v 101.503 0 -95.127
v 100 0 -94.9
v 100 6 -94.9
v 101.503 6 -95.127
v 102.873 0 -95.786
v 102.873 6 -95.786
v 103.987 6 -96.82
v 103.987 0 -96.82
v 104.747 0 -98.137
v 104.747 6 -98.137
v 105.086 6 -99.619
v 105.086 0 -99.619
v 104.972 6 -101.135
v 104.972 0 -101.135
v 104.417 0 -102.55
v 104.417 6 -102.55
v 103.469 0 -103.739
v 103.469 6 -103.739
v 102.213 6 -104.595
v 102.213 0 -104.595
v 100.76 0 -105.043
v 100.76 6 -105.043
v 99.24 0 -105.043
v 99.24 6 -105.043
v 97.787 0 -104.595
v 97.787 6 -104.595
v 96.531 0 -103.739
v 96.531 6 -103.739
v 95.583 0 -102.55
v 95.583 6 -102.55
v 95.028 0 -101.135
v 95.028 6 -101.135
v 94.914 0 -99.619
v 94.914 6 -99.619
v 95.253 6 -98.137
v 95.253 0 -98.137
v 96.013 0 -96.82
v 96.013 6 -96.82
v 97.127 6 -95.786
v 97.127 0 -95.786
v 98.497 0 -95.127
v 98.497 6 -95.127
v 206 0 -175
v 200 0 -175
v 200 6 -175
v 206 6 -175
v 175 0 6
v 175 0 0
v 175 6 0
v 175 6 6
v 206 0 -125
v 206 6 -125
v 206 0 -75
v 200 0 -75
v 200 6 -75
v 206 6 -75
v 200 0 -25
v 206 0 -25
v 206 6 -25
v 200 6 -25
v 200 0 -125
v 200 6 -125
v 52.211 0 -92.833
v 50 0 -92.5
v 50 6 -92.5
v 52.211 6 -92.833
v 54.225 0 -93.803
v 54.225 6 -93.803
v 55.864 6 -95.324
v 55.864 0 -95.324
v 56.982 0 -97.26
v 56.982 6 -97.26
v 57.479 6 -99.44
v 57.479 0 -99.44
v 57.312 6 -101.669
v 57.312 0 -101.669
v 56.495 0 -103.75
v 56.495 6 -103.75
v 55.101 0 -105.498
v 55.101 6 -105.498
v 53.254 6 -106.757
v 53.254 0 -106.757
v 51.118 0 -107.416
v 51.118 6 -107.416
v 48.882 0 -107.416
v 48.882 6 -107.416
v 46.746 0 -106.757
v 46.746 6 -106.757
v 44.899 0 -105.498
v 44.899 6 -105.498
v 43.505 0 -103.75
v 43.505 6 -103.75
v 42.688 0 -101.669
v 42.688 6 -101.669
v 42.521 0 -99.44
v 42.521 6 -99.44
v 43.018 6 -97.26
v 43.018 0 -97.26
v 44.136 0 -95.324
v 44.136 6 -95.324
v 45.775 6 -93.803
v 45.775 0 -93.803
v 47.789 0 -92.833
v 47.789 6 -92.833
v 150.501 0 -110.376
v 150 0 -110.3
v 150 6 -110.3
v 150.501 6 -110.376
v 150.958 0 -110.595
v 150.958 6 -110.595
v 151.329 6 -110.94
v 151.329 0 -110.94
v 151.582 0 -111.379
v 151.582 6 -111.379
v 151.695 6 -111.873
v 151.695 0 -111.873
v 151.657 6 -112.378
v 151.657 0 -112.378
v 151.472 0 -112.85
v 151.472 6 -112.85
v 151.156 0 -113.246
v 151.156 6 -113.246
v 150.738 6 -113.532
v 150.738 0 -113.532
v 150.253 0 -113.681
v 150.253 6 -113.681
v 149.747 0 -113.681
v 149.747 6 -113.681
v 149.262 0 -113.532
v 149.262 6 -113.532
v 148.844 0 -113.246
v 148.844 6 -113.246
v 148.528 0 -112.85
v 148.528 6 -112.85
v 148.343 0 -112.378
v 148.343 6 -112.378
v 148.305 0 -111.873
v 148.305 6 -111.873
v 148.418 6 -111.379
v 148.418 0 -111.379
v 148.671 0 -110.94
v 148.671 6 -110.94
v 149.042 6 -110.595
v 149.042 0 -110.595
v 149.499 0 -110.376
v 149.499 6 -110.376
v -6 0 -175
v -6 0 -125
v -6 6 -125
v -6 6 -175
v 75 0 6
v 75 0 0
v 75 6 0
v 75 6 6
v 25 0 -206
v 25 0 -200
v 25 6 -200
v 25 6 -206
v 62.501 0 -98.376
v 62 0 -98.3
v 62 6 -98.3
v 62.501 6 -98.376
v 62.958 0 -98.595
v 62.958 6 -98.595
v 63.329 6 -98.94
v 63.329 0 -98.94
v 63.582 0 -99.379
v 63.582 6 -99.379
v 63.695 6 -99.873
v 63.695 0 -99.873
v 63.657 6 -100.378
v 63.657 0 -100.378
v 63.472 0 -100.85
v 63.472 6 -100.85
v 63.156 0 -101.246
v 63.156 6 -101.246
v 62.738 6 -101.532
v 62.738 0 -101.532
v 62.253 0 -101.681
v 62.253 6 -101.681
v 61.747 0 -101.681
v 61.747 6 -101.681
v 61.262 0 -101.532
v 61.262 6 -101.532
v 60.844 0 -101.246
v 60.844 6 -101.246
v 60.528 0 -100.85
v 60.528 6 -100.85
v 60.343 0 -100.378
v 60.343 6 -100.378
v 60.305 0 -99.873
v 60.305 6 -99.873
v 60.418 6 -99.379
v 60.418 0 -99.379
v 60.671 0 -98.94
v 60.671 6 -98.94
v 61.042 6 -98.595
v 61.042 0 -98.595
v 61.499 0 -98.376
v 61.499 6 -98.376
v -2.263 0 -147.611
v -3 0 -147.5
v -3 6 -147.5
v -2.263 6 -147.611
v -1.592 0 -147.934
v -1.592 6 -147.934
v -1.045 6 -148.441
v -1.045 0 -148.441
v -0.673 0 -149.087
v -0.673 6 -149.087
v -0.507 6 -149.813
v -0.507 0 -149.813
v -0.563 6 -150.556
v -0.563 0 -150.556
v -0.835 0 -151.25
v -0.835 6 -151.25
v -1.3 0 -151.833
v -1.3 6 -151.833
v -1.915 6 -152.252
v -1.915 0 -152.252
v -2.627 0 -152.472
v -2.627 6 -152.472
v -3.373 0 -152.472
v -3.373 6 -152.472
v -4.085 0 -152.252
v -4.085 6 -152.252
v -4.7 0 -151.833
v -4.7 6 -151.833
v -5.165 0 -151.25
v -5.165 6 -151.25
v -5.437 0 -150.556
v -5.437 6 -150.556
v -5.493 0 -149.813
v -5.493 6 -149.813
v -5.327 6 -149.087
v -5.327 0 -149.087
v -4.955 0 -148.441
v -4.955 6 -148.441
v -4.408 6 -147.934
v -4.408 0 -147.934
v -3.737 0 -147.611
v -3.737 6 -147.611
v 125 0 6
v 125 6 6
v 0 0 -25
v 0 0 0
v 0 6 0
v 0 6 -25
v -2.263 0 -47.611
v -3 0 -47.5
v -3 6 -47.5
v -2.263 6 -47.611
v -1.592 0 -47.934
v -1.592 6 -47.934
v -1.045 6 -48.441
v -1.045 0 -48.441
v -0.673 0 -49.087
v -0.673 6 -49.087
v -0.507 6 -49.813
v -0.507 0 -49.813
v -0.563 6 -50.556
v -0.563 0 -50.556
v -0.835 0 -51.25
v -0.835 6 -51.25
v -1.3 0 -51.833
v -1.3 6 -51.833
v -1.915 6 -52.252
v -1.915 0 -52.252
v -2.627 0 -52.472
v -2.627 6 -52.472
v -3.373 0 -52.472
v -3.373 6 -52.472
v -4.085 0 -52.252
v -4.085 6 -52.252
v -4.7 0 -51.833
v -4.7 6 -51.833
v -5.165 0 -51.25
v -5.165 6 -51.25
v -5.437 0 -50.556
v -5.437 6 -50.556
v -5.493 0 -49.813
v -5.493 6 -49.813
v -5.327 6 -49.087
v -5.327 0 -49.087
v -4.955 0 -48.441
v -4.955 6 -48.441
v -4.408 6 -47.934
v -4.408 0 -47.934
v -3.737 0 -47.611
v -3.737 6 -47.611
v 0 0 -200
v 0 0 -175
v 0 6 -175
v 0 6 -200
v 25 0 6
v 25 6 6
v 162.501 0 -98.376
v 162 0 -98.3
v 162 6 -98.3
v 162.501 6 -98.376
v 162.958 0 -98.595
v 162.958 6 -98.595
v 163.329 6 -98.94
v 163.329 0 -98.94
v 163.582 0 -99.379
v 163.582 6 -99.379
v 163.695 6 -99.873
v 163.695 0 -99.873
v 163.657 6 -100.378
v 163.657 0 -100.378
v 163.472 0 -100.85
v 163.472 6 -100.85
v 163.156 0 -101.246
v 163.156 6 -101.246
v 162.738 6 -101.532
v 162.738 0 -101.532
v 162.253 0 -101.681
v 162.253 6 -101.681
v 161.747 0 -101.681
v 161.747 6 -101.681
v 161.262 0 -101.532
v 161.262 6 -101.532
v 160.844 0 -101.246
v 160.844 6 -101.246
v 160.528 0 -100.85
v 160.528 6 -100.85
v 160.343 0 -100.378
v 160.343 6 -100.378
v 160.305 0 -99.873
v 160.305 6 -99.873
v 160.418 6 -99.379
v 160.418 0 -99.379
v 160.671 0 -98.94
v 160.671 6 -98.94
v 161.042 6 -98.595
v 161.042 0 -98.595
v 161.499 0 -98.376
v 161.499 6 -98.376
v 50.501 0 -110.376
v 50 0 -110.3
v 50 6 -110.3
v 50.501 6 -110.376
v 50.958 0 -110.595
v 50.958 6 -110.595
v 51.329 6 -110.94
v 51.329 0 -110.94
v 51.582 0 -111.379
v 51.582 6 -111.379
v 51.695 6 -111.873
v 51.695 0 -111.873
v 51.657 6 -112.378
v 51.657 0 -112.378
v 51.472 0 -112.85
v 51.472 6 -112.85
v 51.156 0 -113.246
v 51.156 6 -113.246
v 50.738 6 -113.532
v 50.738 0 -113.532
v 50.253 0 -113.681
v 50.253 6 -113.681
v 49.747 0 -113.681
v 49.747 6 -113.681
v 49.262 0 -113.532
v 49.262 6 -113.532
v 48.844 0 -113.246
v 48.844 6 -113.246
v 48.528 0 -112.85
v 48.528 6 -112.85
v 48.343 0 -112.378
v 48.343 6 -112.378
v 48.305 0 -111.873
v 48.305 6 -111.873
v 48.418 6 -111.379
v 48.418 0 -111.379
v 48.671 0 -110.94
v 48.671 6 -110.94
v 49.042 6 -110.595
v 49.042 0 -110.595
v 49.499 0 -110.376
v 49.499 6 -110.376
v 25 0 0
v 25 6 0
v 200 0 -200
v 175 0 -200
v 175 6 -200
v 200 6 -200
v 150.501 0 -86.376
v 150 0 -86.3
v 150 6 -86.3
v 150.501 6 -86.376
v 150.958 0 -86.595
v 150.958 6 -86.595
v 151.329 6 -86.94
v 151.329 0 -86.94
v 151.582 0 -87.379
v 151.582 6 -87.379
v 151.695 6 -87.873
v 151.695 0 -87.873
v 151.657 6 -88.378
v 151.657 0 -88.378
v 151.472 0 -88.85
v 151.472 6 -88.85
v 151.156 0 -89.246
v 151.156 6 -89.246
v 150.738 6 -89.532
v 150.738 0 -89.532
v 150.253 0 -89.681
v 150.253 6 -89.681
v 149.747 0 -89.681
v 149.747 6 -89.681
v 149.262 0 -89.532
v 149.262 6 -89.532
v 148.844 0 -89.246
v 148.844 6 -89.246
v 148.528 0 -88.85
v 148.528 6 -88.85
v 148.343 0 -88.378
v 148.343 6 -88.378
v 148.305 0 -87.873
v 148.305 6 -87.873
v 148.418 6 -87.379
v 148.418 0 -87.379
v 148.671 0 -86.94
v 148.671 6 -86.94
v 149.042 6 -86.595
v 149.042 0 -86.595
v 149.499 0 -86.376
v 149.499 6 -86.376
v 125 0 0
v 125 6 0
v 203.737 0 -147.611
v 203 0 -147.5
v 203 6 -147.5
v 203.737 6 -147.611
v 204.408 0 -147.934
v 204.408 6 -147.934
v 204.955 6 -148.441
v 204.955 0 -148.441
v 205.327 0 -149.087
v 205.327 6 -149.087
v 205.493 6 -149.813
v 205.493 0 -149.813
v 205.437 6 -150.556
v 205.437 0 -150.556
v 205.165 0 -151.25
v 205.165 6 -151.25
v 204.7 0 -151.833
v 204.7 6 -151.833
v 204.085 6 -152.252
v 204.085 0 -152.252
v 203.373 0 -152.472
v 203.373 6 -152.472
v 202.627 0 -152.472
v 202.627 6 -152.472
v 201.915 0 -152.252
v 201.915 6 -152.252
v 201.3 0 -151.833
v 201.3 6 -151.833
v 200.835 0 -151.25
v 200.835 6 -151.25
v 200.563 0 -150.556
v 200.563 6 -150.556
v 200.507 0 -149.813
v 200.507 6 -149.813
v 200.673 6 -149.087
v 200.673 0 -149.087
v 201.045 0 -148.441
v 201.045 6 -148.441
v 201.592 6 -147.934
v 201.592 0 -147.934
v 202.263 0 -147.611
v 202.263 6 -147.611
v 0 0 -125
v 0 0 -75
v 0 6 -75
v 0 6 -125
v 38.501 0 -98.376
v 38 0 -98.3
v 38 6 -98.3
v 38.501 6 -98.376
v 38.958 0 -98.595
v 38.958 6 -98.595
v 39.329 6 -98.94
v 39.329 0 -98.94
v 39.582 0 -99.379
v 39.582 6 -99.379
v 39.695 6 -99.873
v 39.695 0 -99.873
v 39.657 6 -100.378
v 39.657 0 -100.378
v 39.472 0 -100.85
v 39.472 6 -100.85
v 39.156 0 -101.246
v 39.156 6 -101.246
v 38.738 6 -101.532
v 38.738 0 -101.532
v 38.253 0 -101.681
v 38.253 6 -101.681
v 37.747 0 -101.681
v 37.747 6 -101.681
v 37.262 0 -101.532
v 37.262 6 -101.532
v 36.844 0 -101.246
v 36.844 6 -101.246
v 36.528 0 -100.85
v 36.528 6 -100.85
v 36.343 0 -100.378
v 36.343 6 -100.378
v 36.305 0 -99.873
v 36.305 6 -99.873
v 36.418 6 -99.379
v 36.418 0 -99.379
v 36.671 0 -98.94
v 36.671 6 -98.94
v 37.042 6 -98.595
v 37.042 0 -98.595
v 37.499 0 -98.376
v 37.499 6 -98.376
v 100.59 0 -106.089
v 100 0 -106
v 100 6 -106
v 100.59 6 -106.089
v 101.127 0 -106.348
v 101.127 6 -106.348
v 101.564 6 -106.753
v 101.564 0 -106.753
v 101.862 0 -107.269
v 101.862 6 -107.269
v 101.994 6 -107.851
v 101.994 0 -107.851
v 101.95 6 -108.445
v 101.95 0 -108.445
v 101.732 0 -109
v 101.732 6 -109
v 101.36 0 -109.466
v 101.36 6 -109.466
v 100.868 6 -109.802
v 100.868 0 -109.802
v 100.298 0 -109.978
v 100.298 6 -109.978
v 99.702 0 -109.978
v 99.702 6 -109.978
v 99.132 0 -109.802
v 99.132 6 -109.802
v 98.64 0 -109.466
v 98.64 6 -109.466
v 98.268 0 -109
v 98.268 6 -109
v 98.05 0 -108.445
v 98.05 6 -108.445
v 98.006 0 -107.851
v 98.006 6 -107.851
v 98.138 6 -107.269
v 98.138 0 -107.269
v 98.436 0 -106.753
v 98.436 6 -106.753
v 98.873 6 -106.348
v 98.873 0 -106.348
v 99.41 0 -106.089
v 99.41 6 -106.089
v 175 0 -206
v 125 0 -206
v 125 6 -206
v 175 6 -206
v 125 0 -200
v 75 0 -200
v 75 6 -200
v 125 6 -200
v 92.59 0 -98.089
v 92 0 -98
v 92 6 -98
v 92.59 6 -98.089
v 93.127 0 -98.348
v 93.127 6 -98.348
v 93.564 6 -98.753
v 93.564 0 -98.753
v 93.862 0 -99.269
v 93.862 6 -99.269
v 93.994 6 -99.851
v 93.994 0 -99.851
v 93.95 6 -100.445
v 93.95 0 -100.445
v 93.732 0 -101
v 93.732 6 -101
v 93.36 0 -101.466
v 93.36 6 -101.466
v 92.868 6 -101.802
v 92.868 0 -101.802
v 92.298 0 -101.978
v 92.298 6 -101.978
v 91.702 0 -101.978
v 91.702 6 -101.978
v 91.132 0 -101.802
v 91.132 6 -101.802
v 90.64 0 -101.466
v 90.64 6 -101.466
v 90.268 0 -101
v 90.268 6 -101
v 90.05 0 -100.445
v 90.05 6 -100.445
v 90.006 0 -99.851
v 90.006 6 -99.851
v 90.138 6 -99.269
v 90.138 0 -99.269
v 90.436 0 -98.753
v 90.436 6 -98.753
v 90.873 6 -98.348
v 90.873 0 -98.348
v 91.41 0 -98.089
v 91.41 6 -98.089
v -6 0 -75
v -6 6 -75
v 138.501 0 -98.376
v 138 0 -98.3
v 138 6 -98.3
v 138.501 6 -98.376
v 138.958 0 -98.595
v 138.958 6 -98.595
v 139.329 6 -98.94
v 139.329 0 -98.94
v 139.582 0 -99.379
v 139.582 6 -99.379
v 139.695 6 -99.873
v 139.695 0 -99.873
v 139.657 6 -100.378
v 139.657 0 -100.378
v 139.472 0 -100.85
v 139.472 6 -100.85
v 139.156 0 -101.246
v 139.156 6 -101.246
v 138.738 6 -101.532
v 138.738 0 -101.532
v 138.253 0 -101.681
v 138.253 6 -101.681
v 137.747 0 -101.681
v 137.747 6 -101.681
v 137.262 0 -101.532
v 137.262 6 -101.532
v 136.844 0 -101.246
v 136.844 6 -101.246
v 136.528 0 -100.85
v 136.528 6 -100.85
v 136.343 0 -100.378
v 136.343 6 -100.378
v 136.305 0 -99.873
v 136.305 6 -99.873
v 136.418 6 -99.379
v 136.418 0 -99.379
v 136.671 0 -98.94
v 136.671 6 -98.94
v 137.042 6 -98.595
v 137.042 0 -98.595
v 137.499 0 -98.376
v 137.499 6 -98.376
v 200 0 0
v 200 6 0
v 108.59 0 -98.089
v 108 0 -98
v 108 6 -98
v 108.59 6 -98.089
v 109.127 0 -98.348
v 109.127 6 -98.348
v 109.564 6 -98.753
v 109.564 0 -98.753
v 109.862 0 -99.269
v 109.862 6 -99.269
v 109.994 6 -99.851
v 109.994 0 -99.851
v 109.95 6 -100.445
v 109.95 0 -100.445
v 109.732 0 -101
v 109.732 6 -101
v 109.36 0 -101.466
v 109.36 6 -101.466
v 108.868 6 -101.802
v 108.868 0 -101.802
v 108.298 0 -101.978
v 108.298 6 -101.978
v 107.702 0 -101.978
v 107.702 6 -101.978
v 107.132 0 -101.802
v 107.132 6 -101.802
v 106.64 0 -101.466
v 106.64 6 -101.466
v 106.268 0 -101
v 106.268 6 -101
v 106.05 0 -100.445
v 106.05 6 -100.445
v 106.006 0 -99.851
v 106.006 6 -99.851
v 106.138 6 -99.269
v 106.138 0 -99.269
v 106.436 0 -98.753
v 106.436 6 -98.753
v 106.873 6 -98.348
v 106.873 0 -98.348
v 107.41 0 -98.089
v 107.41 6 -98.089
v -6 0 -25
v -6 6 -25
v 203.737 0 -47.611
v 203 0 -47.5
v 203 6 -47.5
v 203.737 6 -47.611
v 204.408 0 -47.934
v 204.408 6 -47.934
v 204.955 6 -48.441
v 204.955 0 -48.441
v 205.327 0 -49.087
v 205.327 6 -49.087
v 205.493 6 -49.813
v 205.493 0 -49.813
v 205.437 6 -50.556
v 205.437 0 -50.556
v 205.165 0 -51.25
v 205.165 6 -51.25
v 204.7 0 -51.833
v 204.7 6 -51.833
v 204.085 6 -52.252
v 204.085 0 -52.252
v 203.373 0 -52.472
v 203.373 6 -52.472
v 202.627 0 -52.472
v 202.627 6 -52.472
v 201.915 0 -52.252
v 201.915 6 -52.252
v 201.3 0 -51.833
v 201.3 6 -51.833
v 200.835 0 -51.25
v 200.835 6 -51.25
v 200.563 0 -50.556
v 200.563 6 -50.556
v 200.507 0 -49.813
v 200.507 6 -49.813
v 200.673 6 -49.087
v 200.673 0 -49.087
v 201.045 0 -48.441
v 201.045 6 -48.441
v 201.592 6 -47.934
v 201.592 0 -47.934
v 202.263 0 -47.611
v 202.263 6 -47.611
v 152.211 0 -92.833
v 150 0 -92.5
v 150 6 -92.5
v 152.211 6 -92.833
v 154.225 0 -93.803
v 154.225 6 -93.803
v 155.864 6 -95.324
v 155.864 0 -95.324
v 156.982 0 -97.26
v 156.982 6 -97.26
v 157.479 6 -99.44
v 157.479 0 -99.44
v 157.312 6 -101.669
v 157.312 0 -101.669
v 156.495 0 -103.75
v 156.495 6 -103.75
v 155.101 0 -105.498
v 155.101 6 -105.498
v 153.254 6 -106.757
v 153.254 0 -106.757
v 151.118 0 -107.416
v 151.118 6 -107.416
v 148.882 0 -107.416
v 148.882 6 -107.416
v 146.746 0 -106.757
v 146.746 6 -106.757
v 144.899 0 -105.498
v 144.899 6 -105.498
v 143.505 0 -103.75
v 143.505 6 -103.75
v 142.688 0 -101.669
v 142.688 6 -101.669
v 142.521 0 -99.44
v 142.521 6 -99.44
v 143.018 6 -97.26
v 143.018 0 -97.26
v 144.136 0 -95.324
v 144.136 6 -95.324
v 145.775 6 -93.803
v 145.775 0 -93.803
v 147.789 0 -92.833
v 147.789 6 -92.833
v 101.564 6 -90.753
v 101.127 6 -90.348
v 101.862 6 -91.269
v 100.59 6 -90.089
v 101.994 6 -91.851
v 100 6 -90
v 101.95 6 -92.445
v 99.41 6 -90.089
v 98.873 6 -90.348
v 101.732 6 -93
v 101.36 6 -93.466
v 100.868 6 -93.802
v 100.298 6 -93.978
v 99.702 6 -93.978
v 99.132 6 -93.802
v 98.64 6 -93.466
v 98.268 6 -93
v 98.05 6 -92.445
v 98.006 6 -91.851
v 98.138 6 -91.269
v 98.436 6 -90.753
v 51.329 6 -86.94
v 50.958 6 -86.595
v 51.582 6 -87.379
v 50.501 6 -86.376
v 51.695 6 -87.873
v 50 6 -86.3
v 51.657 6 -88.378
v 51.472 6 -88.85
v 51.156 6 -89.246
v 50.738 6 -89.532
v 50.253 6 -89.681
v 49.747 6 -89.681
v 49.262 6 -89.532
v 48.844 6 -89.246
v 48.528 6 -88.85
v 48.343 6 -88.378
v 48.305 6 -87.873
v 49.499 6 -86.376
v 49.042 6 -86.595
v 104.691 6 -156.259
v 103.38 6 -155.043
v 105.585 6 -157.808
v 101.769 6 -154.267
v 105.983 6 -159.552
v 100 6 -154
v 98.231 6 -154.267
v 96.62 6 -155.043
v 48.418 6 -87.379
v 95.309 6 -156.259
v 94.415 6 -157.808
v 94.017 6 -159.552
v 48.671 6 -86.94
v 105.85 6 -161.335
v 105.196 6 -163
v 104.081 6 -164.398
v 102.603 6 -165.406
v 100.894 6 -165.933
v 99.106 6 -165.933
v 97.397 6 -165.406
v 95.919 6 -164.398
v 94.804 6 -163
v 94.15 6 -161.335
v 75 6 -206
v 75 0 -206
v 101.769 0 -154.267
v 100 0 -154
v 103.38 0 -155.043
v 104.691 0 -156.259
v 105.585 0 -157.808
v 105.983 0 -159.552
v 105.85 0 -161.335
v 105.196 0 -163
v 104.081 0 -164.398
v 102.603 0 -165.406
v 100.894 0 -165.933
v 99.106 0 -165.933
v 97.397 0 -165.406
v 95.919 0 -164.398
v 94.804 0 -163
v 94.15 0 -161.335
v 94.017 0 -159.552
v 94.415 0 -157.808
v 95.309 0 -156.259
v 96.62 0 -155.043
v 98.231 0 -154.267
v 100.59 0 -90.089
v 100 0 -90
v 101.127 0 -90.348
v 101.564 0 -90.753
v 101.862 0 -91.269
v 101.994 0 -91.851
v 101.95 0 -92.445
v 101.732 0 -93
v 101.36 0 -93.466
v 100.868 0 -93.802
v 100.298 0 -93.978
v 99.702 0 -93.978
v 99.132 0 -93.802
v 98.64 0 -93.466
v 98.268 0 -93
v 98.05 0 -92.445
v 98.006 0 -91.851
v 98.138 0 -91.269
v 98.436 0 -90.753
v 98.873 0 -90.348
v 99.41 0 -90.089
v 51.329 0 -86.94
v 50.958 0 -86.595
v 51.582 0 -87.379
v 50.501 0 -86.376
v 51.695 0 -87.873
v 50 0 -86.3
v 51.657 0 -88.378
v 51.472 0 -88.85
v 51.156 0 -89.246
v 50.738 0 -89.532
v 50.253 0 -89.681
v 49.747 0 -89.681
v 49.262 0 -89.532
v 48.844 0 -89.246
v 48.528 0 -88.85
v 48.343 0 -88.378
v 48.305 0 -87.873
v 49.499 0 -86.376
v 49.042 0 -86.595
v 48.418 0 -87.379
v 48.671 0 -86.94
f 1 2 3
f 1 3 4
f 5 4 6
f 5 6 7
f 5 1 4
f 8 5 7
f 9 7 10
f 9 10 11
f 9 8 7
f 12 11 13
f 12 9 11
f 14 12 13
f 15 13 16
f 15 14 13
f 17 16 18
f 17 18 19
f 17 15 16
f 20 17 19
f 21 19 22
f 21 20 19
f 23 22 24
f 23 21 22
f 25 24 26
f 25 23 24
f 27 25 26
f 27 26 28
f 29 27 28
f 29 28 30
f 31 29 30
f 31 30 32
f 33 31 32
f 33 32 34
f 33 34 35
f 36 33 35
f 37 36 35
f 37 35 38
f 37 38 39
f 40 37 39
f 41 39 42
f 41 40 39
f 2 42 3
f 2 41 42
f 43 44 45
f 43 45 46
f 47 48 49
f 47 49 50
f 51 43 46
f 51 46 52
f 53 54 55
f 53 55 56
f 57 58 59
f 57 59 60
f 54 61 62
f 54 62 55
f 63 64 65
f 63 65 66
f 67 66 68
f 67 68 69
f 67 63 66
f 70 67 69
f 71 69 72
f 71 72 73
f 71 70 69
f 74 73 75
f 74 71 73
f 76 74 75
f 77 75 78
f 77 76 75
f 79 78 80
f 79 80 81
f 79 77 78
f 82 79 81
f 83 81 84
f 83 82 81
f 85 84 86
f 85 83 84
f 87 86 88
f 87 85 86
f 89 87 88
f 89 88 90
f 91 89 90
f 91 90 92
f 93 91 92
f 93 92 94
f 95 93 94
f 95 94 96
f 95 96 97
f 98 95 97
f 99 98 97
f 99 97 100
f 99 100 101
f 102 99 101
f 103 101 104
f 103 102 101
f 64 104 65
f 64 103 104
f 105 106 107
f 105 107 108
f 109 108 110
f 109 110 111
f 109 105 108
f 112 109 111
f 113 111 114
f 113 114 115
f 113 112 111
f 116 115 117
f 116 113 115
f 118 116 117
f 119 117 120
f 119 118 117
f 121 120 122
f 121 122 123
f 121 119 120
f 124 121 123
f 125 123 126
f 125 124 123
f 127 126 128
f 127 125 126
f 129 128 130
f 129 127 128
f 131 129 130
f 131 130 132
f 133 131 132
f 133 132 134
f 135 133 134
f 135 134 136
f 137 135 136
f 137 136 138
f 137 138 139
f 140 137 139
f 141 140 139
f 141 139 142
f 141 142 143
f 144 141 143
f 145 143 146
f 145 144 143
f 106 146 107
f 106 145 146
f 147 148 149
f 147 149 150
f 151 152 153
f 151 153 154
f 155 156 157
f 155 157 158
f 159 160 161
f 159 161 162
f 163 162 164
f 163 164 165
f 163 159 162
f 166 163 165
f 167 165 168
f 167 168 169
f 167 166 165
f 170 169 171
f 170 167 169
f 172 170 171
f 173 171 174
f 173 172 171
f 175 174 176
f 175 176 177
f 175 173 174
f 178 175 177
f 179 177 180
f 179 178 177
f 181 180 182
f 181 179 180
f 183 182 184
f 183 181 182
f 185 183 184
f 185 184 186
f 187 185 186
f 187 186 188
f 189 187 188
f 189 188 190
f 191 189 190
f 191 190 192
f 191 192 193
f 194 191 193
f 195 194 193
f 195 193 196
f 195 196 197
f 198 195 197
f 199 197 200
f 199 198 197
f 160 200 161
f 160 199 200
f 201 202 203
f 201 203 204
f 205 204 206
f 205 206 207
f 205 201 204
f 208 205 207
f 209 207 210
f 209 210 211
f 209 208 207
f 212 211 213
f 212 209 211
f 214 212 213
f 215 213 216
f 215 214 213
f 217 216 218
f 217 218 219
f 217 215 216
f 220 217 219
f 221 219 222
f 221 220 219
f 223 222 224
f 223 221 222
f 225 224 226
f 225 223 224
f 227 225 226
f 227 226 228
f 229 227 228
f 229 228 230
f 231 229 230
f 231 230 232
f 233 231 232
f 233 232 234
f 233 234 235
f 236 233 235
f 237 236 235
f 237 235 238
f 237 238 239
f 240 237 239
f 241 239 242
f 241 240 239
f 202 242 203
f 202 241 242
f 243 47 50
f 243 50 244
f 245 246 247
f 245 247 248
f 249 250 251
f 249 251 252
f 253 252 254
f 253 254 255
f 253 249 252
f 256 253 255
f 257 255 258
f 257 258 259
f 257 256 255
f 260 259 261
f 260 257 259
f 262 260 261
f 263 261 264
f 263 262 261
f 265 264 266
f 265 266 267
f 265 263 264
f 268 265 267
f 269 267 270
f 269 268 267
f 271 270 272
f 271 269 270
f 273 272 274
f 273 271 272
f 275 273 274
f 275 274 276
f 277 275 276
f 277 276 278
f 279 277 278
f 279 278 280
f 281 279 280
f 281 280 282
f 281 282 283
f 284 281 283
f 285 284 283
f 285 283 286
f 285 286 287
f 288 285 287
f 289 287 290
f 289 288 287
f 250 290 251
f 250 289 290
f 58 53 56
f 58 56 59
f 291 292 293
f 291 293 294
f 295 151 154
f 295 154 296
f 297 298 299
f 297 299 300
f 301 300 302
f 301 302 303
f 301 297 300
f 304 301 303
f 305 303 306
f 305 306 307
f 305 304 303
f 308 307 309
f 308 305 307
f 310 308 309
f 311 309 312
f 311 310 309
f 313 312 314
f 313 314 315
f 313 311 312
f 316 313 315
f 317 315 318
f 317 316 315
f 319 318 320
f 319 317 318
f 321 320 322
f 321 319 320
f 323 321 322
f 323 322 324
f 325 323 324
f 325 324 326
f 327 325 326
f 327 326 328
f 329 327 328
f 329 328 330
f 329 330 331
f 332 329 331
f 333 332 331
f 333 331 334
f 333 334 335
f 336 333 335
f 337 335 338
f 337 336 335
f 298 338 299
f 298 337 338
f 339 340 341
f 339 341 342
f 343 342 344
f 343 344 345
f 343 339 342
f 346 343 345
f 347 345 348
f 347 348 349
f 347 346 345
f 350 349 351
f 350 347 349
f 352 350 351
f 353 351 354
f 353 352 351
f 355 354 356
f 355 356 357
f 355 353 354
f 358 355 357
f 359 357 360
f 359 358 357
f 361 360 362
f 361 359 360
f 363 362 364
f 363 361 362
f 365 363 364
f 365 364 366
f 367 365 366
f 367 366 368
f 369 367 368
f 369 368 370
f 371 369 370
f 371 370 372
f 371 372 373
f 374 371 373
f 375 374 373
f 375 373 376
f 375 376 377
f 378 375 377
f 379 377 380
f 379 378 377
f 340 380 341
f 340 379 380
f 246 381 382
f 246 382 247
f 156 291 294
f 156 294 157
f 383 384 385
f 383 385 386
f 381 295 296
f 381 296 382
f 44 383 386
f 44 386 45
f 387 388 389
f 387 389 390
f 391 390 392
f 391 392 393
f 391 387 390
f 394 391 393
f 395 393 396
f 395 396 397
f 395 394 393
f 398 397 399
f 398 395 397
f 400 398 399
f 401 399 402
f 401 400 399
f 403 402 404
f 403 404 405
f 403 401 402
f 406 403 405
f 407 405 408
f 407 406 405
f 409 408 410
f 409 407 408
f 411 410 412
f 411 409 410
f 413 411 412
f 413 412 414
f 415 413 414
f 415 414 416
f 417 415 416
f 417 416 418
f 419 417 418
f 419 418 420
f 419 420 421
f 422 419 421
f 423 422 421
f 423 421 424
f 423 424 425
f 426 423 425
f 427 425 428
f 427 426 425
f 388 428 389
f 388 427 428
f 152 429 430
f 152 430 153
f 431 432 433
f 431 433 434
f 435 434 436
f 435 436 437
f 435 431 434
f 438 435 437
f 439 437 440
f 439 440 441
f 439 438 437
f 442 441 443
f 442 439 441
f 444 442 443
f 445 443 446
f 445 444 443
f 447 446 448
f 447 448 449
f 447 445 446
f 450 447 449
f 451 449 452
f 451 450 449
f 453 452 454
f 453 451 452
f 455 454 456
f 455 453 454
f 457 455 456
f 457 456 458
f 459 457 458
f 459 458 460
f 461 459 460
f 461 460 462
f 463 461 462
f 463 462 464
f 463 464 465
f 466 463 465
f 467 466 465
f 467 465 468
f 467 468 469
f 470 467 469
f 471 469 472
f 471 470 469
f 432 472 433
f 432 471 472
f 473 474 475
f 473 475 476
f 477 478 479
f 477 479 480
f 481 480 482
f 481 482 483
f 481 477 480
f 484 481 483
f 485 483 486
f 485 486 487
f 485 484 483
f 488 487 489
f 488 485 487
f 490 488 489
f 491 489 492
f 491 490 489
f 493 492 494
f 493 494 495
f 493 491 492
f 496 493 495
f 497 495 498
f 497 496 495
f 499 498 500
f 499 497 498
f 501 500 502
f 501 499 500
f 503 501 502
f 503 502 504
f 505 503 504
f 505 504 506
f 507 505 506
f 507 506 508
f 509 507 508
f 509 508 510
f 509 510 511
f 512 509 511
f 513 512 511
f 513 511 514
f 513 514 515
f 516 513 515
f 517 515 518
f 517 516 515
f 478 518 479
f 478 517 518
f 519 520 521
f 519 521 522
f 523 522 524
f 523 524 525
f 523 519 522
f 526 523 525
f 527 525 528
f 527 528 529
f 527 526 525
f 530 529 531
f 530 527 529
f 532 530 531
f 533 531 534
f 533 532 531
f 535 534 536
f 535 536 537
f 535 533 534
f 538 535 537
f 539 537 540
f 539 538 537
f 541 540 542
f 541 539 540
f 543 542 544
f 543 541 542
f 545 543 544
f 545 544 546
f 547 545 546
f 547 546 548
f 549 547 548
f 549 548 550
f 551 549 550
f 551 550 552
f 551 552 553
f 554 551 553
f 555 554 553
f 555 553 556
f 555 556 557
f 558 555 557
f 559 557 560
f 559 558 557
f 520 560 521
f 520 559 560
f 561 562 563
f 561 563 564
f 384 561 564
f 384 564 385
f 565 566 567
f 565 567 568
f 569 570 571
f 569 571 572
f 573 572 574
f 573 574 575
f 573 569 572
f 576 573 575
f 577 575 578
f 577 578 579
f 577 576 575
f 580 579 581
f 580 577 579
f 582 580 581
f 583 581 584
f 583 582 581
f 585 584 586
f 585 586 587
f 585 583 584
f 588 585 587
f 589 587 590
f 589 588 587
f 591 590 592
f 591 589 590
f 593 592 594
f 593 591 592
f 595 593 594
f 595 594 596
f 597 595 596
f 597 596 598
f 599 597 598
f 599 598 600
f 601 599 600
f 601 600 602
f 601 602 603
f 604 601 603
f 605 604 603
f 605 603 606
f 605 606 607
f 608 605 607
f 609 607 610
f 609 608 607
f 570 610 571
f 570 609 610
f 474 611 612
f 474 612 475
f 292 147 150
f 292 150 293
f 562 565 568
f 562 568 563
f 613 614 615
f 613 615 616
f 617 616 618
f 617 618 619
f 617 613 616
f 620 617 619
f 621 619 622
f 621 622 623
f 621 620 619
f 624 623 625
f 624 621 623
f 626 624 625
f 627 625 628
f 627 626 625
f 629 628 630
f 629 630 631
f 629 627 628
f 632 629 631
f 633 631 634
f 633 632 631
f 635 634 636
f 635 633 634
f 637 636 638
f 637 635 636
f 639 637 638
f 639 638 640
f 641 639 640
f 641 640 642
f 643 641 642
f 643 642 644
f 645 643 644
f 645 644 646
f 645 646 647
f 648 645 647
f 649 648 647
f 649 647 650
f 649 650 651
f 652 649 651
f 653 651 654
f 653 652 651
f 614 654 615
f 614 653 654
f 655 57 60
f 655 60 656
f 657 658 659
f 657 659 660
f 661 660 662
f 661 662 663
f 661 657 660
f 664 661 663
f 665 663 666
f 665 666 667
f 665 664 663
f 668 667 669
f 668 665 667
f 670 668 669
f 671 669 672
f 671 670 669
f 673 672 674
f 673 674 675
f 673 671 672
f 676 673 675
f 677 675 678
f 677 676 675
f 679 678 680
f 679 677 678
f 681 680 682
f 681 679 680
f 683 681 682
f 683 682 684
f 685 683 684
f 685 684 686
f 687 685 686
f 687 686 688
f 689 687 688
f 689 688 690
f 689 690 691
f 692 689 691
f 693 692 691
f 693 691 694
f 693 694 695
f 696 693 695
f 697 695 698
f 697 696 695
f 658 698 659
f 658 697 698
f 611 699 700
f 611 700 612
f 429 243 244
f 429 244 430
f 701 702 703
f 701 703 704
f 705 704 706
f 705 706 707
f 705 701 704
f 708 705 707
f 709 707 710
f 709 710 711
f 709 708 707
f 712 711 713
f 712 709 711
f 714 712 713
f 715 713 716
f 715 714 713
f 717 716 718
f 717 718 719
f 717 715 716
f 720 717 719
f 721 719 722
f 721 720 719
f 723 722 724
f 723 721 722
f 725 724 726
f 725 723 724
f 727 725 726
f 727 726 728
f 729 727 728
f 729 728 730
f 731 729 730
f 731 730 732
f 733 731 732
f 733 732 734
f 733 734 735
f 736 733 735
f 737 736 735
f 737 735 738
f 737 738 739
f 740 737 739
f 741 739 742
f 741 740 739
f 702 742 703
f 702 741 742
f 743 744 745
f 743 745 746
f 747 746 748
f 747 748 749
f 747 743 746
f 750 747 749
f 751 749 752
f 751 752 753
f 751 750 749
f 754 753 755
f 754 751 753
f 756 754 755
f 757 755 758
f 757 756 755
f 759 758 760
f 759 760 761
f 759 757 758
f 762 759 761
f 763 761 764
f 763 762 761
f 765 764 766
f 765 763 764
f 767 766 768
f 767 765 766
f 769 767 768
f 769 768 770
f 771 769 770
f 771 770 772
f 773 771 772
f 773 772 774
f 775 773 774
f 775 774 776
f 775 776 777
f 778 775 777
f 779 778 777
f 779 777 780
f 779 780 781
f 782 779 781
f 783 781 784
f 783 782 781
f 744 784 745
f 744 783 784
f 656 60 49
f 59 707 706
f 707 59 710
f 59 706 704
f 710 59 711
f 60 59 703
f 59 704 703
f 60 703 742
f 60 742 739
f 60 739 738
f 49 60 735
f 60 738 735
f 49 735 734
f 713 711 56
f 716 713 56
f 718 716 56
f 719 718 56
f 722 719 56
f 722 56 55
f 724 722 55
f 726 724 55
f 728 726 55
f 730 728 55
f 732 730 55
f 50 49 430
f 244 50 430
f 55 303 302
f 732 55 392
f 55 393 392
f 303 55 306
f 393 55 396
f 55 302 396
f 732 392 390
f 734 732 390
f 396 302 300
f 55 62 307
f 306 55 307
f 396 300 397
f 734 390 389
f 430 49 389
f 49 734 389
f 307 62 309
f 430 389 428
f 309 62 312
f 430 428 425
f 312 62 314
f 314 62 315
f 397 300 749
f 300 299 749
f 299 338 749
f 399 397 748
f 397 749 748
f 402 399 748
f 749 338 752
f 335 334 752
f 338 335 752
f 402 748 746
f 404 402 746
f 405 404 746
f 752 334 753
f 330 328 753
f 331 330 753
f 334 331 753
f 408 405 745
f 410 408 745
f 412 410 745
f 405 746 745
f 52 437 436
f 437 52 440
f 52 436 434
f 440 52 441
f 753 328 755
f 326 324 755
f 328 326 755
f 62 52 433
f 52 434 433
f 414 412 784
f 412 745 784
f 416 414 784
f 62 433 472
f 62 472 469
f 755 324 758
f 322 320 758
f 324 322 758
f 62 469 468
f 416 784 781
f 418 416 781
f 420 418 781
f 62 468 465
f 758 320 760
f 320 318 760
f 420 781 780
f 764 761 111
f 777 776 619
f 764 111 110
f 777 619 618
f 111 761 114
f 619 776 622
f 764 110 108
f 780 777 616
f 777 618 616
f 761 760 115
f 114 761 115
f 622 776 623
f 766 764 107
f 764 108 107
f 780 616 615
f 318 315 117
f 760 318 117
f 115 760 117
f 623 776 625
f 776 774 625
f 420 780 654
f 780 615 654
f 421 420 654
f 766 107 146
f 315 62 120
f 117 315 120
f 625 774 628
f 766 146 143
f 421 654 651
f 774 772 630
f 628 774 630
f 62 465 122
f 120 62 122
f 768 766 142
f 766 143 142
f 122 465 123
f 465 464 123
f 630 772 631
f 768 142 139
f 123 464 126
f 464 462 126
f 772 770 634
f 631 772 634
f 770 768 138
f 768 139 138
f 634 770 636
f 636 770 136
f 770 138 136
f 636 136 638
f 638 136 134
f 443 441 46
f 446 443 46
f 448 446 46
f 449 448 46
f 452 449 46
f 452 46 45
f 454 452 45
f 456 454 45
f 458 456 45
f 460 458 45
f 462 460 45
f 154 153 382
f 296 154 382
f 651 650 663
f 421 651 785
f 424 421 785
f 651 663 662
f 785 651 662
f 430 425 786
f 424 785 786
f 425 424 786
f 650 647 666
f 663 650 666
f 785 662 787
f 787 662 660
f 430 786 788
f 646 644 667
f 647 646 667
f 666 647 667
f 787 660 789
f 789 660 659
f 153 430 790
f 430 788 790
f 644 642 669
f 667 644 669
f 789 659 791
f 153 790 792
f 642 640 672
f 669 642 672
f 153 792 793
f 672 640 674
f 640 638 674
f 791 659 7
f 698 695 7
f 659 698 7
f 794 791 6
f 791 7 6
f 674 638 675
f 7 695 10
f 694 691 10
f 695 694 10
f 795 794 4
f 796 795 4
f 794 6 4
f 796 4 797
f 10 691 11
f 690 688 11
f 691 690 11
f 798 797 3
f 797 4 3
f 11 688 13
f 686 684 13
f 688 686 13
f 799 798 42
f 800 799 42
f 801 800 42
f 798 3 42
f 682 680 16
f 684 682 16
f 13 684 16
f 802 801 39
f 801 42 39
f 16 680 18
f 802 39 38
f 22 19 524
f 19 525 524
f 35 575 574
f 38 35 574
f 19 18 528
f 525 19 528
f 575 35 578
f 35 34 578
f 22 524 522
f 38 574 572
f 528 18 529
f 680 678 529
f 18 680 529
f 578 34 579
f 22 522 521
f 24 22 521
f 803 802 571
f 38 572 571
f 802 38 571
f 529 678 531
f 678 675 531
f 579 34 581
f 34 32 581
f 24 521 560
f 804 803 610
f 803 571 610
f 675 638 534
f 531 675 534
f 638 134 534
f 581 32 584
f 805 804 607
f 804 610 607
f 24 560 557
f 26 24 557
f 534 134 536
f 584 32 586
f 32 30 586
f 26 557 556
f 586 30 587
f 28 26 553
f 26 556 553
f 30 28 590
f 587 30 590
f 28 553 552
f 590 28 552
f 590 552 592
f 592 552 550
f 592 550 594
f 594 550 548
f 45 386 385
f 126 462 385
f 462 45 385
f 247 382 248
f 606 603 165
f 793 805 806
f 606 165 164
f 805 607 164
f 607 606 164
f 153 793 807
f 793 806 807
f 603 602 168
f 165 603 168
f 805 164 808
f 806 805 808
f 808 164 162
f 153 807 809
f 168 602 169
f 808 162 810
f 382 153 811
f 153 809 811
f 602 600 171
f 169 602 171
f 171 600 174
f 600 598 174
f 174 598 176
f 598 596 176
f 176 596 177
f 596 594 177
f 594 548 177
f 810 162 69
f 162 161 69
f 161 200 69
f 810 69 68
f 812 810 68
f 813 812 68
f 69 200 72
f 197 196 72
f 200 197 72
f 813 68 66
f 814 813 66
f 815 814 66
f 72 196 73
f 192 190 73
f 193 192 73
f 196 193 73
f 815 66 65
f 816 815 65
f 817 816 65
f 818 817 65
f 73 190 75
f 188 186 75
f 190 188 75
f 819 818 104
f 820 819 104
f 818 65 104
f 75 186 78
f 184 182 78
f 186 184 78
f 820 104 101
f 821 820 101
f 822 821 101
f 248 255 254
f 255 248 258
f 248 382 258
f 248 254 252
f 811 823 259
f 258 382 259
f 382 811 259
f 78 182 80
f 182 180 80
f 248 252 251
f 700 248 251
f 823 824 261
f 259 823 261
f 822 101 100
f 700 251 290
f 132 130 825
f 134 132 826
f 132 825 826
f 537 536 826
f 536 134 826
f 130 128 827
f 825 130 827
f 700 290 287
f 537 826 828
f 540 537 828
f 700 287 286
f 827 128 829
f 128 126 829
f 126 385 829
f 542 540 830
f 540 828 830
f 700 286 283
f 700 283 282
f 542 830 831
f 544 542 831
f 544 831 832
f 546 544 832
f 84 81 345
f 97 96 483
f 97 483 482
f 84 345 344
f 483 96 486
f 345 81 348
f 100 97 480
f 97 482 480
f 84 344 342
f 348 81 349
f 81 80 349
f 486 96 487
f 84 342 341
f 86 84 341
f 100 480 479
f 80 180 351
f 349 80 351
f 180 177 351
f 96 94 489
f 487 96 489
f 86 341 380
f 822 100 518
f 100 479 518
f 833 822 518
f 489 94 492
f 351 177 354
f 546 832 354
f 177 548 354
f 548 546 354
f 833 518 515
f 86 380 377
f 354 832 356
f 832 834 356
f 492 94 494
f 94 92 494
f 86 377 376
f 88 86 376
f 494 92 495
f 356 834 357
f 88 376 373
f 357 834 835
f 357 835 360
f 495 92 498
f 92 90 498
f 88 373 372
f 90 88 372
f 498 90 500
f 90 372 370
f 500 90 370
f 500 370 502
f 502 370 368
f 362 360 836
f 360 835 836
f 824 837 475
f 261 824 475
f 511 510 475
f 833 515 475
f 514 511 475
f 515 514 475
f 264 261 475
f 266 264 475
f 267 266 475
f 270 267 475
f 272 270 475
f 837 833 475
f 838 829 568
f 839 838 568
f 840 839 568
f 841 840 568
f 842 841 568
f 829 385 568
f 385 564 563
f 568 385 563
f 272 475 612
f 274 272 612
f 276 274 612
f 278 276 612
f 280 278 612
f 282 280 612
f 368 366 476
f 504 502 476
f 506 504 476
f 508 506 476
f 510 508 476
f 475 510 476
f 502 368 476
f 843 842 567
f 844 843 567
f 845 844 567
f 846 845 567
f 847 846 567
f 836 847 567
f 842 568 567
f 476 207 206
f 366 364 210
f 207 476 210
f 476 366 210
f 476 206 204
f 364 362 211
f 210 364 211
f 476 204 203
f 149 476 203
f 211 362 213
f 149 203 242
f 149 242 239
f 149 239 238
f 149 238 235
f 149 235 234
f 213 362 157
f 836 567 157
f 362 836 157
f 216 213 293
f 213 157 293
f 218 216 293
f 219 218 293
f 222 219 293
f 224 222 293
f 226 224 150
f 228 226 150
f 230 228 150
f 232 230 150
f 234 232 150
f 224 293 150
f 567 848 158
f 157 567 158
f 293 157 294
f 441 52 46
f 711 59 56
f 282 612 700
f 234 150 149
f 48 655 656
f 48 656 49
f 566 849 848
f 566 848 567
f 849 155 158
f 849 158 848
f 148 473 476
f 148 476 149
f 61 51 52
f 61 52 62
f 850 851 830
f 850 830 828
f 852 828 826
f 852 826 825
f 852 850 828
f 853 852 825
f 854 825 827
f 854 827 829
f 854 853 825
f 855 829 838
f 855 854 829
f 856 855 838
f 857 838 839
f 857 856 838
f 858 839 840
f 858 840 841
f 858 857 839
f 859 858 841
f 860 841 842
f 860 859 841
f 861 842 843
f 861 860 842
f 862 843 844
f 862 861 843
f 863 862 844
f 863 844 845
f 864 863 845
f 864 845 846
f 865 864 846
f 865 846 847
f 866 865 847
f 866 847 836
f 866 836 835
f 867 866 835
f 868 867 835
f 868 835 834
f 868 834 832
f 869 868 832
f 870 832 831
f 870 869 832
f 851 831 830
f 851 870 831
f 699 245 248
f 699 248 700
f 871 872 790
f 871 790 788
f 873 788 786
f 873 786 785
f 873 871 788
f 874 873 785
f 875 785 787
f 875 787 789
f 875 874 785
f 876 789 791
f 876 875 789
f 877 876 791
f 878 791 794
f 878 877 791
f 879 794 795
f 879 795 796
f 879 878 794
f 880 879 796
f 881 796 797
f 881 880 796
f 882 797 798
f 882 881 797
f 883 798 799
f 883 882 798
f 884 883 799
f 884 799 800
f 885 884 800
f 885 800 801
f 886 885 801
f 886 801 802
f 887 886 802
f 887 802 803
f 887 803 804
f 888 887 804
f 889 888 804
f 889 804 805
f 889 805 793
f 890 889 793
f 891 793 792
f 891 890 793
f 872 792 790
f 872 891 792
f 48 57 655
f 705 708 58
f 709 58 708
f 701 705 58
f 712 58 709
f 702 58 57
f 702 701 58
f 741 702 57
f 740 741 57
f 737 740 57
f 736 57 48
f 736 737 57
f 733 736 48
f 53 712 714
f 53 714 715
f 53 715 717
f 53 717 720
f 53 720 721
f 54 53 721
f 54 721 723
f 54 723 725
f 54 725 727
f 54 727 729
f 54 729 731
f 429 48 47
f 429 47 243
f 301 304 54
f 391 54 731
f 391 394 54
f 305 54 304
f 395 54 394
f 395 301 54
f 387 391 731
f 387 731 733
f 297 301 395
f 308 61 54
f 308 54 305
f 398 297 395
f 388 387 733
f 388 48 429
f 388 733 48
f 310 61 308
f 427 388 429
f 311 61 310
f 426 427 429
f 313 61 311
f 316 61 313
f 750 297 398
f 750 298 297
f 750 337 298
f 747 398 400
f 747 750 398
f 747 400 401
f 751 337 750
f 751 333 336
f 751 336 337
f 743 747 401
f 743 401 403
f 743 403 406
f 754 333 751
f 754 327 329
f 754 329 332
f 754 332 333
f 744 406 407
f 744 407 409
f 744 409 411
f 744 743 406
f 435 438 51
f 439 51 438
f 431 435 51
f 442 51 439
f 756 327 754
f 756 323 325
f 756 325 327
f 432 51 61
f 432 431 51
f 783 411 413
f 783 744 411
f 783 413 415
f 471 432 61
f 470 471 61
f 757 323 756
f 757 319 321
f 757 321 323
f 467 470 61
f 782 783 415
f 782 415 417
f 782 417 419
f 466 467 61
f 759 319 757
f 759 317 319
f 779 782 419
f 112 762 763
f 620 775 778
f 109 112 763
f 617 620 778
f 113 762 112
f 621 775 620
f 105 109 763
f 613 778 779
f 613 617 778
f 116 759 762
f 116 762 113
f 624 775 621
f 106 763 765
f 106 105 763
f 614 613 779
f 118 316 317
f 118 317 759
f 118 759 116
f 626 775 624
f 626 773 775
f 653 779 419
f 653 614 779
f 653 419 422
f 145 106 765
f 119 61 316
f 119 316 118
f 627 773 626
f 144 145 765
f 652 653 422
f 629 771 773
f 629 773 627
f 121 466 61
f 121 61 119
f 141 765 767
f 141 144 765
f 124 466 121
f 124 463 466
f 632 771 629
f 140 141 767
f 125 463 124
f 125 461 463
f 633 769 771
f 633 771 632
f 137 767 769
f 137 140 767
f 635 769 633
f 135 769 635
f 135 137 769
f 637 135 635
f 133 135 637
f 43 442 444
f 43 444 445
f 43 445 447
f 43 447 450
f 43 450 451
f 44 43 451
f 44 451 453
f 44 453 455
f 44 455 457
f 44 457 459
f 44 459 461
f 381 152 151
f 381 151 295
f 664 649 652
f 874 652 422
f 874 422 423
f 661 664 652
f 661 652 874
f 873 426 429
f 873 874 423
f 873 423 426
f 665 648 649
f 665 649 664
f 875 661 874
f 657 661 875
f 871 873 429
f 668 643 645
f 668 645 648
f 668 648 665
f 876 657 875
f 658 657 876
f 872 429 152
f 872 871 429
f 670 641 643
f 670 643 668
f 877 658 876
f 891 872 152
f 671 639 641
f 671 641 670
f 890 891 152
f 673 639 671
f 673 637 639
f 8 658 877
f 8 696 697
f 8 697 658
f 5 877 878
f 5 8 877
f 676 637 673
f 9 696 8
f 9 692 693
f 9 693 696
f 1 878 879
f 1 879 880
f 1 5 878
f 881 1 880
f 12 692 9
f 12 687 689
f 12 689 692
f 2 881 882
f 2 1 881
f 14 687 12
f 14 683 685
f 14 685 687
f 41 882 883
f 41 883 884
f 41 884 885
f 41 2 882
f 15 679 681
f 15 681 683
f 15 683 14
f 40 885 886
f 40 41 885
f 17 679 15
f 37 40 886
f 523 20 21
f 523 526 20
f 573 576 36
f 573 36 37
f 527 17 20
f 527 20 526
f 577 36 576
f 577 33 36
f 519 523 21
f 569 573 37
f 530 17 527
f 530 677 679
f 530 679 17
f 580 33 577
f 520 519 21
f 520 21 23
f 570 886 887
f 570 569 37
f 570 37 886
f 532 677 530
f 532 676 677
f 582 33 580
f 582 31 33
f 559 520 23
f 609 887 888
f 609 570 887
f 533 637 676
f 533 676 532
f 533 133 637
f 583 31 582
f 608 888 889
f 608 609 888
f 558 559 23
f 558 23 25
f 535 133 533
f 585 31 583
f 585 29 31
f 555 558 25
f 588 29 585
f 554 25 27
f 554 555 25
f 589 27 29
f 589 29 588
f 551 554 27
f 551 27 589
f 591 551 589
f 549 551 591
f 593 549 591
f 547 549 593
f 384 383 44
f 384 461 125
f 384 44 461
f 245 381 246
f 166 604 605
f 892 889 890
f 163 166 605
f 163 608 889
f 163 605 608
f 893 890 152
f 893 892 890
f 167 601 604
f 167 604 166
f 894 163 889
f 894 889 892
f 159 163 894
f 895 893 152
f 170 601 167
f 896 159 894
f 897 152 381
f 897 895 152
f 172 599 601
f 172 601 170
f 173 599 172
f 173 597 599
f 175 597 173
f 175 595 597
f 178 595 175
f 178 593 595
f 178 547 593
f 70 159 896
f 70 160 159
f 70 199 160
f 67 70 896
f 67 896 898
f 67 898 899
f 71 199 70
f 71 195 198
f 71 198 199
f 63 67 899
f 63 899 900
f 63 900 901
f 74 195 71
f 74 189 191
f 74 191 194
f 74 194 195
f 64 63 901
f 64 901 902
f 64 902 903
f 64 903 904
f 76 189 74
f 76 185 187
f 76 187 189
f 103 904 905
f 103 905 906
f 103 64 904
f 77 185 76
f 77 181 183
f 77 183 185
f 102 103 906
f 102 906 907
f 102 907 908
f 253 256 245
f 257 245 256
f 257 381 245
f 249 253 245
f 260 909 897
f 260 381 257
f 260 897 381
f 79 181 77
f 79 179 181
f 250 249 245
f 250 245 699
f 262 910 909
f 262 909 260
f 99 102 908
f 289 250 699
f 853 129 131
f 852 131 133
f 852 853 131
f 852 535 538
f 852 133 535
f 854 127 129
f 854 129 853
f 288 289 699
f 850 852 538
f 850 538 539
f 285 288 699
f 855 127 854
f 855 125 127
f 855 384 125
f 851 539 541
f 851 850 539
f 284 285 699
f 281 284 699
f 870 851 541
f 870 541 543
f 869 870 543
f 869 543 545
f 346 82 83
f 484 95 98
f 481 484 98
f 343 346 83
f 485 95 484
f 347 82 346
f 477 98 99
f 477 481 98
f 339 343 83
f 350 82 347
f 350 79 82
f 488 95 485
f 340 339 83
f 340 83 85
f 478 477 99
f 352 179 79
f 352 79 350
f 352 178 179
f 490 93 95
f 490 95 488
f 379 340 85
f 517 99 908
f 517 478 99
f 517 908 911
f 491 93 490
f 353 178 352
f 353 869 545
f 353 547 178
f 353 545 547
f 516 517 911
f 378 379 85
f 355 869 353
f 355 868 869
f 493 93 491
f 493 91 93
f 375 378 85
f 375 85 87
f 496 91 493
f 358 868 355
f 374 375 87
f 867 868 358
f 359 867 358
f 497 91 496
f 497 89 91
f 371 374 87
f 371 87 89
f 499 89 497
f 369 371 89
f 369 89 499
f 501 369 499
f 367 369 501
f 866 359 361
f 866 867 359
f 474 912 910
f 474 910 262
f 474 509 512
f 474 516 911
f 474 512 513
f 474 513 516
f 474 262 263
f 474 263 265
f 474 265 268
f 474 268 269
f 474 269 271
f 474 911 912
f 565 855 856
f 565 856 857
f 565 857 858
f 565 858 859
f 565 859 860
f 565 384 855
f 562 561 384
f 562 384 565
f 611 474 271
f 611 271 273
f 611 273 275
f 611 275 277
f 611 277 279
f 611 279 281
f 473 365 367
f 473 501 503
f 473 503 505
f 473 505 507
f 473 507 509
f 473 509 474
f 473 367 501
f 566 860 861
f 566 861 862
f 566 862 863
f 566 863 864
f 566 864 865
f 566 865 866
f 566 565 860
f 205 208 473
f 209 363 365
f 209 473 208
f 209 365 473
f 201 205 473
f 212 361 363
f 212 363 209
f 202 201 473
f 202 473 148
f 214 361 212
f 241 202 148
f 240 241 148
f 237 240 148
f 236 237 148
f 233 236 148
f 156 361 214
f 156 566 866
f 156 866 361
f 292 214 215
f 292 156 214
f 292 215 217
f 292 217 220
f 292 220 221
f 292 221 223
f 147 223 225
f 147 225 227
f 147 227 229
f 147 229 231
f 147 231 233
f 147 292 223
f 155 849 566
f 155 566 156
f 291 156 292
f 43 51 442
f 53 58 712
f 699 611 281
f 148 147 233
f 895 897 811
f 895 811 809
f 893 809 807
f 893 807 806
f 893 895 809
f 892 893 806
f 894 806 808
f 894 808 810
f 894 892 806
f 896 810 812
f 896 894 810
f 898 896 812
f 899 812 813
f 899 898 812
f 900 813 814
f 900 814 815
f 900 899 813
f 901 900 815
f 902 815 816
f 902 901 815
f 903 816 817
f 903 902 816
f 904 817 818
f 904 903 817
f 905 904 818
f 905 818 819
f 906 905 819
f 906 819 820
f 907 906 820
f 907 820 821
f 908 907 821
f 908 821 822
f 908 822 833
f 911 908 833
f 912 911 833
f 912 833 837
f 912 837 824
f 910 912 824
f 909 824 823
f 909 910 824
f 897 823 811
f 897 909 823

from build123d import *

# Parameters (mm, degrees)
SKETCH_1_R      = 5.1
SKETCH_1_R_2    = 1.7
SKETCH_1_R_3    = 2
SKETCH_1_R_4    = 7.5
SKETCH_1_R_5    = 6
SKETCH_1_R_6    = 2.5
EXTRUDE_1_DEPTH = 6


with BuildPart() as part:
    # 草图1 → 凸台-拉伸1 (new body)
    with BuildSketch(Plane(origin=(0, 0, 0), x_dir=(1, 0, 0), z_dir=(0, 1, 0))):
        Polygon((0, 200), (25, 200), (25, 206), (75, 206), (75, 200), (125, 200), (125, 206), (175, 206), (175, 200), (200, 200), (200, 175), (206, 175), (206, 125), (200, 125), (200, 75), (206, 75), (206, 25), (200, 25), (200, 0), (175, 0), (175, -6), (125, -6), (125, 0), (75, 0), (75, -6), (25, -6), (25, 0), (0, 0), (0, 25), (-6, 25), (-6, 75), (0, 75), (0, 125), (-6, 125), (-6, 175), (0, 175), align=None)
        with Locations(Location((100, 100, 0), (0, 0, 270))):
            Circle(SKETCH_1_R, mode=Mode.SUBTRACT)
        with Locations(Location((150, 112, 0), (0, 0, 270))):
            Circle(SKETCH_1_R_2, mode=Mode.SUBTRACT)
        with Locations(Location((100, 108, 0), (0, 0, 270))):
            Circle(SKETCH_1_R_3, mode=Mode.SUBTRACT)
        with Locations(Location((108, 100, 0), (0, 0, 270))):
            Circle(SKETCH_1_R_3, mode=Mode.SUBTRACT)
        with Locations(Location((100, 92, 0), (0, 0, 270))):
            Circle(SKETCH_1_R_3, mode=Mode.SUBTRACT)
        with Locations(Location((92, 100, 0), (0, 0, 270))):
            Circle(SKETCH_1_R_3, mode=Mode.SUBTRACT)
        with Locations(Location((50, 100, 0), (0, 0, 270))):
            Circle(SKETCH_1_R_4, mode=Mode.SUBTRACT)
        with Locations(Location((50, 112, 0), (0, 0, 270))):
            Circle(SKETCH_1_R_2, mode=Mode.SUBTRACT)
        with Locations(Location((62, 100, 0), (0, 0, 270))):
            Circle(SKETCH_1_R_2, mode=Mode.SUBTRACT)
        with Locations(Location((50, 88, 0), (0, 0, 270))):
            Circle(SKETCH_1_R_2, mode=Mode.SUBTRACT)
        with Locations(Location((38, 100, 0), (0, 0, 270))):
            Circle(SKETCH_1_R_2, mode=Mode.SUBTRACT)
        with Locations(Location((162, 100, 0), (0, 0, 270))):
            Circle(SKETCH_1_R_2, mode=Mode.SUBTRACT)
        with Locations(Location((138, 100, 0), (0, 0, 270))):
            Circle(SKETCH_1_R_2, mode=Mode.SUBTRACT)
        with Locations(Location((150, 88, 0), (0, 0, 270))):
            Circle(SKETCH_1_R_2, mode=Mode.SUBTRACT)
        with Locations(Location((150, 100, 0), (0, 0, 270))):
            Circle(SKETCH_1_R_4, mode=Mode.SUBTRACT)
        with Locations(Location((100, 160, 0), (0, 0, 270))):
            Circle(SKETCH_1_R_5, mode=Mode.SUBTRACT)
        with Locations(Location((-3, 150, 0), (0, 0, 270))):
            Circle(SKETCH_1_R_6, mode=Mode.SUBTRACT)
        with Locations(Location((203, 150, 0), (0, 0, 270))):
            Circle(SKETCH_1_R_6, mode=Mode.SUBTRACT)
        with Locations(Location((203, 50, 0), (0, 0, 270))):
            Circle(SKETCH_1_R_6, mode=Mode.SUBTRACT)
        with Locations(Location((-3, 50, 0), (0, 0, 270))):
            Circle(SKETCH_1_R_6, mode=Mode.SUBTRACT)
    extrude(amount=EXTRUDE_1_DEPTH)


solid = part.part
